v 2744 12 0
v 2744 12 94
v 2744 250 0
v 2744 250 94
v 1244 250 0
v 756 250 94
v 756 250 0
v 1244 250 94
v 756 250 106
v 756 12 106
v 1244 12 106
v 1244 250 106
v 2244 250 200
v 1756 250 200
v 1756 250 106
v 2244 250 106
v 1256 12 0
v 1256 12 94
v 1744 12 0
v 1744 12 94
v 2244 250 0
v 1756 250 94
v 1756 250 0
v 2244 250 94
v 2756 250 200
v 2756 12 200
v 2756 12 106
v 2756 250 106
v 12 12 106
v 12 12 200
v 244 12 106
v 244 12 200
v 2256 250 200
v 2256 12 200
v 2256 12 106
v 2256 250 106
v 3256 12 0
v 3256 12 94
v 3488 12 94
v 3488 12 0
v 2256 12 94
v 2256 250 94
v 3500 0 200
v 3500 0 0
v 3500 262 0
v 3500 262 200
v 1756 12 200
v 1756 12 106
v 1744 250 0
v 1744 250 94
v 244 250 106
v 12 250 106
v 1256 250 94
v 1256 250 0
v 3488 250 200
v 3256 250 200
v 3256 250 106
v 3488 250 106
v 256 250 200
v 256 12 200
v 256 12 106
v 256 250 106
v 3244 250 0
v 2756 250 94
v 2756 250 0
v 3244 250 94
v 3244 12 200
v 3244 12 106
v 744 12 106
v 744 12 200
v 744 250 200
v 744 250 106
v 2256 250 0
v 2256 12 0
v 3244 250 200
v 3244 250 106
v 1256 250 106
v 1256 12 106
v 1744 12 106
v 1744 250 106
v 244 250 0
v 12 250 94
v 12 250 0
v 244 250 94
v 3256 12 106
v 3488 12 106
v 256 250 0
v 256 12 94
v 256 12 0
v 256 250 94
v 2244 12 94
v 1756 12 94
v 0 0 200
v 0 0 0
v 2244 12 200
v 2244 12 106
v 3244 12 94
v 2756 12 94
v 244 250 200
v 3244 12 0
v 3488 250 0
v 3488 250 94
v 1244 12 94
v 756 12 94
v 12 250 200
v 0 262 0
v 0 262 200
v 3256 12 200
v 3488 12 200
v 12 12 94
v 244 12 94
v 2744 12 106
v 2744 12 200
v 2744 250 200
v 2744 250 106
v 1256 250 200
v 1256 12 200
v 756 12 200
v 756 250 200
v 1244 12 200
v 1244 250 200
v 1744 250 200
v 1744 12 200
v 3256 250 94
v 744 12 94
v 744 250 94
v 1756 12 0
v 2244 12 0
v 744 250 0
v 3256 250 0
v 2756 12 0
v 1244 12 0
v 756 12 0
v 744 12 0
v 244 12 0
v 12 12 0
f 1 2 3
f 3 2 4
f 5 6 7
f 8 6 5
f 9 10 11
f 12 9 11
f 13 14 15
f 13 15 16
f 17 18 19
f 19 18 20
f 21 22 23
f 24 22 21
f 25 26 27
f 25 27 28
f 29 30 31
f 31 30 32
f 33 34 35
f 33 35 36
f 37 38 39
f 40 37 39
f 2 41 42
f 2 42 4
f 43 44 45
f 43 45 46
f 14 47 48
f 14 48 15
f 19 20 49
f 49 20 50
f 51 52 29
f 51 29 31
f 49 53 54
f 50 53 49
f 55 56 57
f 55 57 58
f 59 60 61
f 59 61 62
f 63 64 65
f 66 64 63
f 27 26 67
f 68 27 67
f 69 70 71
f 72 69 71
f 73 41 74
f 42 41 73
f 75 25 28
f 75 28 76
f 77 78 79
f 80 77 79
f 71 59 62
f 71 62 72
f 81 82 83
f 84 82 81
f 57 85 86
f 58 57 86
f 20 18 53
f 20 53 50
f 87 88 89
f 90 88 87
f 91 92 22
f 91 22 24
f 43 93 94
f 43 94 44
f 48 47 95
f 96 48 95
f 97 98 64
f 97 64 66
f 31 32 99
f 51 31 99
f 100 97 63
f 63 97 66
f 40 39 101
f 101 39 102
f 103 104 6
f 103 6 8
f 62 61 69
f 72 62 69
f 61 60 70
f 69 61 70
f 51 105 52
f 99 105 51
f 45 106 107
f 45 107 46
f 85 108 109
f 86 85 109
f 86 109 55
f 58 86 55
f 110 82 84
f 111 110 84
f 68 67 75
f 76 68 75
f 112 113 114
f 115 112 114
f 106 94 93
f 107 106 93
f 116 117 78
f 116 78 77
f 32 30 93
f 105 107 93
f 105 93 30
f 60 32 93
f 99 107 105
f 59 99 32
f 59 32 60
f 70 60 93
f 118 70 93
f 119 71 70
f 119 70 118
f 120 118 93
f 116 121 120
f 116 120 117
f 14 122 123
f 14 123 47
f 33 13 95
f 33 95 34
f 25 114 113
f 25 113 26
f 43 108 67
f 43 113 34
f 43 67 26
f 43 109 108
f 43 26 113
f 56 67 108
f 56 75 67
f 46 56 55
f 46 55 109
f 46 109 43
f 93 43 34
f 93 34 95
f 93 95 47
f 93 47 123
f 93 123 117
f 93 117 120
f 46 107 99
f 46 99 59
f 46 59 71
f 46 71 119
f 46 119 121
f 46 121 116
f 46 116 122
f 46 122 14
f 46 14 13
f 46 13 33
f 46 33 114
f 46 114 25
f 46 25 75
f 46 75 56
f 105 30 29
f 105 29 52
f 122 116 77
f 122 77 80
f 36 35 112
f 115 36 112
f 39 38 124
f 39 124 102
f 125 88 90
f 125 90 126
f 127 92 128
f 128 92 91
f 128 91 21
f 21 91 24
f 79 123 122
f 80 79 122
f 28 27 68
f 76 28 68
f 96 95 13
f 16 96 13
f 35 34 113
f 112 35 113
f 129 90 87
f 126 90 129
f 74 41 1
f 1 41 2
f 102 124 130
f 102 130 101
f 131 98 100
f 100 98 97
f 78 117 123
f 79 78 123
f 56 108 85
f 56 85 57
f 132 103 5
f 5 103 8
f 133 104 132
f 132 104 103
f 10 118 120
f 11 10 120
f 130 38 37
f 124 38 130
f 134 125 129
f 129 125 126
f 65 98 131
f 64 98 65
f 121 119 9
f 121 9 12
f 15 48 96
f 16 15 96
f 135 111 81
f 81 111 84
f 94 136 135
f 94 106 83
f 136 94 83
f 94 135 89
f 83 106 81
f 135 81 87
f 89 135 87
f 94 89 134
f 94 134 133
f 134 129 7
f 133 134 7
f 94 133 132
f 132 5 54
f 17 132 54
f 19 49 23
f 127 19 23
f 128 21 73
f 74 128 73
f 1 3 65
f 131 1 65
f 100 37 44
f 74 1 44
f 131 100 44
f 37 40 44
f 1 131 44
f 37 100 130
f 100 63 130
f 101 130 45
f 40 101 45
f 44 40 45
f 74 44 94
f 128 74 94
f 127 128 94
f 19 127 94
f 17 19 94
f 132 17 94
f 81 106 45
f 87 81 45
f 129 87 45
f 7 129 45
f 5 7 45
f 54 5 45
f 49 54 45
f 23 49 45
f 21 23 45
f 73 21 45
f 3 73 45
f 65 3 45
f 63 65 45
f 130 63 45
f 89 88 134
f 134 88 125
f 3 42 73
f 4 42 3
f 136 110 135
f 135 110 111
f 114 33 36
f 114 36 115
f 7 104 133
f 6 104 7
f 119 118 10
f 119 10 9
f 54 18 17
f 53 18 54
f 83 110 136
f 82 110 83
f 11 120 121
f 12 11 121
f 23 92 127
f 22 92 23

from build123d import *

# Parameters (mm, degrees)
SKETCH_1_W           = 3500
SKETCH_1_H           = 262
EXTRUDE_1_DEPTH      = 200
SKETCH_5_W           = 232
SKETCH_5_H           = 238
SKETCH_5_W_2         = 488
CUT_EXTRUDE_10_DEPTH = 3516.486310598
SKETCH_7_W           = 3500
SKETCH_7_H           = 12
EXTRUDE_13_DEPTH     = 260


with BuildPart() as part:
    # 草图1 → 拉伸1 (new body)
    with BuildSketch(Plane.XY):
        with Locations((1750, 131)):
            Rectangle(SKETCH_1_W, SKETCH_1_H)
    extrude(amount=EXTRUDE_1_DEPTH)

    # 草图5 → 拉伸10 (cut, through all)
    with BuildSketch(Plane.XY.offset(200)):
        with Locations((128, 131)):
            Rectangle(SKETCH_5_W, SKETCH_5_H)
        with Locations((500, 131)):
            Rectangle(SKETCH_5_W_2, SKETCH_5_H)
        with Locations((1000, 131)):
            Rectangle(SKETCH_5_W_2, SKETCH_5_H)
        with Locations((1500, 131)):
            Rectangle(SKETCH_5_W_2, SKETCH_5_H)
        with Locations((2000, 131)):
            Rectangle(SKETCH_5_W_2, SKETCH_5_H)
        with Locations((2500, 131)):
            Rectangle(SKETCH_5_W_2, SKETCH_5_H)
        with Locations((3000, 131)):
            Rectangle(SKETCH_5_W_2, SKETCH_5_H)
        with Locations((3372, 131)):
            Rectangle(SKETCH_5_W, SKETCH_5_H)
    extrude(amount=-CUT_EXTRUDE_10_DEPTH, mode=Mode.SUBTRACT)

    # 草图7 → 拉伸13 (add)
    with BuildSketch(Plane.XZ):
        with Locations((1750, 100)):
            Rectangle(SKETCH_7_W, SKETCH_7_H)
    extrude(amount=-EXTRUDE_13_DEPTH)


solid = part.part
